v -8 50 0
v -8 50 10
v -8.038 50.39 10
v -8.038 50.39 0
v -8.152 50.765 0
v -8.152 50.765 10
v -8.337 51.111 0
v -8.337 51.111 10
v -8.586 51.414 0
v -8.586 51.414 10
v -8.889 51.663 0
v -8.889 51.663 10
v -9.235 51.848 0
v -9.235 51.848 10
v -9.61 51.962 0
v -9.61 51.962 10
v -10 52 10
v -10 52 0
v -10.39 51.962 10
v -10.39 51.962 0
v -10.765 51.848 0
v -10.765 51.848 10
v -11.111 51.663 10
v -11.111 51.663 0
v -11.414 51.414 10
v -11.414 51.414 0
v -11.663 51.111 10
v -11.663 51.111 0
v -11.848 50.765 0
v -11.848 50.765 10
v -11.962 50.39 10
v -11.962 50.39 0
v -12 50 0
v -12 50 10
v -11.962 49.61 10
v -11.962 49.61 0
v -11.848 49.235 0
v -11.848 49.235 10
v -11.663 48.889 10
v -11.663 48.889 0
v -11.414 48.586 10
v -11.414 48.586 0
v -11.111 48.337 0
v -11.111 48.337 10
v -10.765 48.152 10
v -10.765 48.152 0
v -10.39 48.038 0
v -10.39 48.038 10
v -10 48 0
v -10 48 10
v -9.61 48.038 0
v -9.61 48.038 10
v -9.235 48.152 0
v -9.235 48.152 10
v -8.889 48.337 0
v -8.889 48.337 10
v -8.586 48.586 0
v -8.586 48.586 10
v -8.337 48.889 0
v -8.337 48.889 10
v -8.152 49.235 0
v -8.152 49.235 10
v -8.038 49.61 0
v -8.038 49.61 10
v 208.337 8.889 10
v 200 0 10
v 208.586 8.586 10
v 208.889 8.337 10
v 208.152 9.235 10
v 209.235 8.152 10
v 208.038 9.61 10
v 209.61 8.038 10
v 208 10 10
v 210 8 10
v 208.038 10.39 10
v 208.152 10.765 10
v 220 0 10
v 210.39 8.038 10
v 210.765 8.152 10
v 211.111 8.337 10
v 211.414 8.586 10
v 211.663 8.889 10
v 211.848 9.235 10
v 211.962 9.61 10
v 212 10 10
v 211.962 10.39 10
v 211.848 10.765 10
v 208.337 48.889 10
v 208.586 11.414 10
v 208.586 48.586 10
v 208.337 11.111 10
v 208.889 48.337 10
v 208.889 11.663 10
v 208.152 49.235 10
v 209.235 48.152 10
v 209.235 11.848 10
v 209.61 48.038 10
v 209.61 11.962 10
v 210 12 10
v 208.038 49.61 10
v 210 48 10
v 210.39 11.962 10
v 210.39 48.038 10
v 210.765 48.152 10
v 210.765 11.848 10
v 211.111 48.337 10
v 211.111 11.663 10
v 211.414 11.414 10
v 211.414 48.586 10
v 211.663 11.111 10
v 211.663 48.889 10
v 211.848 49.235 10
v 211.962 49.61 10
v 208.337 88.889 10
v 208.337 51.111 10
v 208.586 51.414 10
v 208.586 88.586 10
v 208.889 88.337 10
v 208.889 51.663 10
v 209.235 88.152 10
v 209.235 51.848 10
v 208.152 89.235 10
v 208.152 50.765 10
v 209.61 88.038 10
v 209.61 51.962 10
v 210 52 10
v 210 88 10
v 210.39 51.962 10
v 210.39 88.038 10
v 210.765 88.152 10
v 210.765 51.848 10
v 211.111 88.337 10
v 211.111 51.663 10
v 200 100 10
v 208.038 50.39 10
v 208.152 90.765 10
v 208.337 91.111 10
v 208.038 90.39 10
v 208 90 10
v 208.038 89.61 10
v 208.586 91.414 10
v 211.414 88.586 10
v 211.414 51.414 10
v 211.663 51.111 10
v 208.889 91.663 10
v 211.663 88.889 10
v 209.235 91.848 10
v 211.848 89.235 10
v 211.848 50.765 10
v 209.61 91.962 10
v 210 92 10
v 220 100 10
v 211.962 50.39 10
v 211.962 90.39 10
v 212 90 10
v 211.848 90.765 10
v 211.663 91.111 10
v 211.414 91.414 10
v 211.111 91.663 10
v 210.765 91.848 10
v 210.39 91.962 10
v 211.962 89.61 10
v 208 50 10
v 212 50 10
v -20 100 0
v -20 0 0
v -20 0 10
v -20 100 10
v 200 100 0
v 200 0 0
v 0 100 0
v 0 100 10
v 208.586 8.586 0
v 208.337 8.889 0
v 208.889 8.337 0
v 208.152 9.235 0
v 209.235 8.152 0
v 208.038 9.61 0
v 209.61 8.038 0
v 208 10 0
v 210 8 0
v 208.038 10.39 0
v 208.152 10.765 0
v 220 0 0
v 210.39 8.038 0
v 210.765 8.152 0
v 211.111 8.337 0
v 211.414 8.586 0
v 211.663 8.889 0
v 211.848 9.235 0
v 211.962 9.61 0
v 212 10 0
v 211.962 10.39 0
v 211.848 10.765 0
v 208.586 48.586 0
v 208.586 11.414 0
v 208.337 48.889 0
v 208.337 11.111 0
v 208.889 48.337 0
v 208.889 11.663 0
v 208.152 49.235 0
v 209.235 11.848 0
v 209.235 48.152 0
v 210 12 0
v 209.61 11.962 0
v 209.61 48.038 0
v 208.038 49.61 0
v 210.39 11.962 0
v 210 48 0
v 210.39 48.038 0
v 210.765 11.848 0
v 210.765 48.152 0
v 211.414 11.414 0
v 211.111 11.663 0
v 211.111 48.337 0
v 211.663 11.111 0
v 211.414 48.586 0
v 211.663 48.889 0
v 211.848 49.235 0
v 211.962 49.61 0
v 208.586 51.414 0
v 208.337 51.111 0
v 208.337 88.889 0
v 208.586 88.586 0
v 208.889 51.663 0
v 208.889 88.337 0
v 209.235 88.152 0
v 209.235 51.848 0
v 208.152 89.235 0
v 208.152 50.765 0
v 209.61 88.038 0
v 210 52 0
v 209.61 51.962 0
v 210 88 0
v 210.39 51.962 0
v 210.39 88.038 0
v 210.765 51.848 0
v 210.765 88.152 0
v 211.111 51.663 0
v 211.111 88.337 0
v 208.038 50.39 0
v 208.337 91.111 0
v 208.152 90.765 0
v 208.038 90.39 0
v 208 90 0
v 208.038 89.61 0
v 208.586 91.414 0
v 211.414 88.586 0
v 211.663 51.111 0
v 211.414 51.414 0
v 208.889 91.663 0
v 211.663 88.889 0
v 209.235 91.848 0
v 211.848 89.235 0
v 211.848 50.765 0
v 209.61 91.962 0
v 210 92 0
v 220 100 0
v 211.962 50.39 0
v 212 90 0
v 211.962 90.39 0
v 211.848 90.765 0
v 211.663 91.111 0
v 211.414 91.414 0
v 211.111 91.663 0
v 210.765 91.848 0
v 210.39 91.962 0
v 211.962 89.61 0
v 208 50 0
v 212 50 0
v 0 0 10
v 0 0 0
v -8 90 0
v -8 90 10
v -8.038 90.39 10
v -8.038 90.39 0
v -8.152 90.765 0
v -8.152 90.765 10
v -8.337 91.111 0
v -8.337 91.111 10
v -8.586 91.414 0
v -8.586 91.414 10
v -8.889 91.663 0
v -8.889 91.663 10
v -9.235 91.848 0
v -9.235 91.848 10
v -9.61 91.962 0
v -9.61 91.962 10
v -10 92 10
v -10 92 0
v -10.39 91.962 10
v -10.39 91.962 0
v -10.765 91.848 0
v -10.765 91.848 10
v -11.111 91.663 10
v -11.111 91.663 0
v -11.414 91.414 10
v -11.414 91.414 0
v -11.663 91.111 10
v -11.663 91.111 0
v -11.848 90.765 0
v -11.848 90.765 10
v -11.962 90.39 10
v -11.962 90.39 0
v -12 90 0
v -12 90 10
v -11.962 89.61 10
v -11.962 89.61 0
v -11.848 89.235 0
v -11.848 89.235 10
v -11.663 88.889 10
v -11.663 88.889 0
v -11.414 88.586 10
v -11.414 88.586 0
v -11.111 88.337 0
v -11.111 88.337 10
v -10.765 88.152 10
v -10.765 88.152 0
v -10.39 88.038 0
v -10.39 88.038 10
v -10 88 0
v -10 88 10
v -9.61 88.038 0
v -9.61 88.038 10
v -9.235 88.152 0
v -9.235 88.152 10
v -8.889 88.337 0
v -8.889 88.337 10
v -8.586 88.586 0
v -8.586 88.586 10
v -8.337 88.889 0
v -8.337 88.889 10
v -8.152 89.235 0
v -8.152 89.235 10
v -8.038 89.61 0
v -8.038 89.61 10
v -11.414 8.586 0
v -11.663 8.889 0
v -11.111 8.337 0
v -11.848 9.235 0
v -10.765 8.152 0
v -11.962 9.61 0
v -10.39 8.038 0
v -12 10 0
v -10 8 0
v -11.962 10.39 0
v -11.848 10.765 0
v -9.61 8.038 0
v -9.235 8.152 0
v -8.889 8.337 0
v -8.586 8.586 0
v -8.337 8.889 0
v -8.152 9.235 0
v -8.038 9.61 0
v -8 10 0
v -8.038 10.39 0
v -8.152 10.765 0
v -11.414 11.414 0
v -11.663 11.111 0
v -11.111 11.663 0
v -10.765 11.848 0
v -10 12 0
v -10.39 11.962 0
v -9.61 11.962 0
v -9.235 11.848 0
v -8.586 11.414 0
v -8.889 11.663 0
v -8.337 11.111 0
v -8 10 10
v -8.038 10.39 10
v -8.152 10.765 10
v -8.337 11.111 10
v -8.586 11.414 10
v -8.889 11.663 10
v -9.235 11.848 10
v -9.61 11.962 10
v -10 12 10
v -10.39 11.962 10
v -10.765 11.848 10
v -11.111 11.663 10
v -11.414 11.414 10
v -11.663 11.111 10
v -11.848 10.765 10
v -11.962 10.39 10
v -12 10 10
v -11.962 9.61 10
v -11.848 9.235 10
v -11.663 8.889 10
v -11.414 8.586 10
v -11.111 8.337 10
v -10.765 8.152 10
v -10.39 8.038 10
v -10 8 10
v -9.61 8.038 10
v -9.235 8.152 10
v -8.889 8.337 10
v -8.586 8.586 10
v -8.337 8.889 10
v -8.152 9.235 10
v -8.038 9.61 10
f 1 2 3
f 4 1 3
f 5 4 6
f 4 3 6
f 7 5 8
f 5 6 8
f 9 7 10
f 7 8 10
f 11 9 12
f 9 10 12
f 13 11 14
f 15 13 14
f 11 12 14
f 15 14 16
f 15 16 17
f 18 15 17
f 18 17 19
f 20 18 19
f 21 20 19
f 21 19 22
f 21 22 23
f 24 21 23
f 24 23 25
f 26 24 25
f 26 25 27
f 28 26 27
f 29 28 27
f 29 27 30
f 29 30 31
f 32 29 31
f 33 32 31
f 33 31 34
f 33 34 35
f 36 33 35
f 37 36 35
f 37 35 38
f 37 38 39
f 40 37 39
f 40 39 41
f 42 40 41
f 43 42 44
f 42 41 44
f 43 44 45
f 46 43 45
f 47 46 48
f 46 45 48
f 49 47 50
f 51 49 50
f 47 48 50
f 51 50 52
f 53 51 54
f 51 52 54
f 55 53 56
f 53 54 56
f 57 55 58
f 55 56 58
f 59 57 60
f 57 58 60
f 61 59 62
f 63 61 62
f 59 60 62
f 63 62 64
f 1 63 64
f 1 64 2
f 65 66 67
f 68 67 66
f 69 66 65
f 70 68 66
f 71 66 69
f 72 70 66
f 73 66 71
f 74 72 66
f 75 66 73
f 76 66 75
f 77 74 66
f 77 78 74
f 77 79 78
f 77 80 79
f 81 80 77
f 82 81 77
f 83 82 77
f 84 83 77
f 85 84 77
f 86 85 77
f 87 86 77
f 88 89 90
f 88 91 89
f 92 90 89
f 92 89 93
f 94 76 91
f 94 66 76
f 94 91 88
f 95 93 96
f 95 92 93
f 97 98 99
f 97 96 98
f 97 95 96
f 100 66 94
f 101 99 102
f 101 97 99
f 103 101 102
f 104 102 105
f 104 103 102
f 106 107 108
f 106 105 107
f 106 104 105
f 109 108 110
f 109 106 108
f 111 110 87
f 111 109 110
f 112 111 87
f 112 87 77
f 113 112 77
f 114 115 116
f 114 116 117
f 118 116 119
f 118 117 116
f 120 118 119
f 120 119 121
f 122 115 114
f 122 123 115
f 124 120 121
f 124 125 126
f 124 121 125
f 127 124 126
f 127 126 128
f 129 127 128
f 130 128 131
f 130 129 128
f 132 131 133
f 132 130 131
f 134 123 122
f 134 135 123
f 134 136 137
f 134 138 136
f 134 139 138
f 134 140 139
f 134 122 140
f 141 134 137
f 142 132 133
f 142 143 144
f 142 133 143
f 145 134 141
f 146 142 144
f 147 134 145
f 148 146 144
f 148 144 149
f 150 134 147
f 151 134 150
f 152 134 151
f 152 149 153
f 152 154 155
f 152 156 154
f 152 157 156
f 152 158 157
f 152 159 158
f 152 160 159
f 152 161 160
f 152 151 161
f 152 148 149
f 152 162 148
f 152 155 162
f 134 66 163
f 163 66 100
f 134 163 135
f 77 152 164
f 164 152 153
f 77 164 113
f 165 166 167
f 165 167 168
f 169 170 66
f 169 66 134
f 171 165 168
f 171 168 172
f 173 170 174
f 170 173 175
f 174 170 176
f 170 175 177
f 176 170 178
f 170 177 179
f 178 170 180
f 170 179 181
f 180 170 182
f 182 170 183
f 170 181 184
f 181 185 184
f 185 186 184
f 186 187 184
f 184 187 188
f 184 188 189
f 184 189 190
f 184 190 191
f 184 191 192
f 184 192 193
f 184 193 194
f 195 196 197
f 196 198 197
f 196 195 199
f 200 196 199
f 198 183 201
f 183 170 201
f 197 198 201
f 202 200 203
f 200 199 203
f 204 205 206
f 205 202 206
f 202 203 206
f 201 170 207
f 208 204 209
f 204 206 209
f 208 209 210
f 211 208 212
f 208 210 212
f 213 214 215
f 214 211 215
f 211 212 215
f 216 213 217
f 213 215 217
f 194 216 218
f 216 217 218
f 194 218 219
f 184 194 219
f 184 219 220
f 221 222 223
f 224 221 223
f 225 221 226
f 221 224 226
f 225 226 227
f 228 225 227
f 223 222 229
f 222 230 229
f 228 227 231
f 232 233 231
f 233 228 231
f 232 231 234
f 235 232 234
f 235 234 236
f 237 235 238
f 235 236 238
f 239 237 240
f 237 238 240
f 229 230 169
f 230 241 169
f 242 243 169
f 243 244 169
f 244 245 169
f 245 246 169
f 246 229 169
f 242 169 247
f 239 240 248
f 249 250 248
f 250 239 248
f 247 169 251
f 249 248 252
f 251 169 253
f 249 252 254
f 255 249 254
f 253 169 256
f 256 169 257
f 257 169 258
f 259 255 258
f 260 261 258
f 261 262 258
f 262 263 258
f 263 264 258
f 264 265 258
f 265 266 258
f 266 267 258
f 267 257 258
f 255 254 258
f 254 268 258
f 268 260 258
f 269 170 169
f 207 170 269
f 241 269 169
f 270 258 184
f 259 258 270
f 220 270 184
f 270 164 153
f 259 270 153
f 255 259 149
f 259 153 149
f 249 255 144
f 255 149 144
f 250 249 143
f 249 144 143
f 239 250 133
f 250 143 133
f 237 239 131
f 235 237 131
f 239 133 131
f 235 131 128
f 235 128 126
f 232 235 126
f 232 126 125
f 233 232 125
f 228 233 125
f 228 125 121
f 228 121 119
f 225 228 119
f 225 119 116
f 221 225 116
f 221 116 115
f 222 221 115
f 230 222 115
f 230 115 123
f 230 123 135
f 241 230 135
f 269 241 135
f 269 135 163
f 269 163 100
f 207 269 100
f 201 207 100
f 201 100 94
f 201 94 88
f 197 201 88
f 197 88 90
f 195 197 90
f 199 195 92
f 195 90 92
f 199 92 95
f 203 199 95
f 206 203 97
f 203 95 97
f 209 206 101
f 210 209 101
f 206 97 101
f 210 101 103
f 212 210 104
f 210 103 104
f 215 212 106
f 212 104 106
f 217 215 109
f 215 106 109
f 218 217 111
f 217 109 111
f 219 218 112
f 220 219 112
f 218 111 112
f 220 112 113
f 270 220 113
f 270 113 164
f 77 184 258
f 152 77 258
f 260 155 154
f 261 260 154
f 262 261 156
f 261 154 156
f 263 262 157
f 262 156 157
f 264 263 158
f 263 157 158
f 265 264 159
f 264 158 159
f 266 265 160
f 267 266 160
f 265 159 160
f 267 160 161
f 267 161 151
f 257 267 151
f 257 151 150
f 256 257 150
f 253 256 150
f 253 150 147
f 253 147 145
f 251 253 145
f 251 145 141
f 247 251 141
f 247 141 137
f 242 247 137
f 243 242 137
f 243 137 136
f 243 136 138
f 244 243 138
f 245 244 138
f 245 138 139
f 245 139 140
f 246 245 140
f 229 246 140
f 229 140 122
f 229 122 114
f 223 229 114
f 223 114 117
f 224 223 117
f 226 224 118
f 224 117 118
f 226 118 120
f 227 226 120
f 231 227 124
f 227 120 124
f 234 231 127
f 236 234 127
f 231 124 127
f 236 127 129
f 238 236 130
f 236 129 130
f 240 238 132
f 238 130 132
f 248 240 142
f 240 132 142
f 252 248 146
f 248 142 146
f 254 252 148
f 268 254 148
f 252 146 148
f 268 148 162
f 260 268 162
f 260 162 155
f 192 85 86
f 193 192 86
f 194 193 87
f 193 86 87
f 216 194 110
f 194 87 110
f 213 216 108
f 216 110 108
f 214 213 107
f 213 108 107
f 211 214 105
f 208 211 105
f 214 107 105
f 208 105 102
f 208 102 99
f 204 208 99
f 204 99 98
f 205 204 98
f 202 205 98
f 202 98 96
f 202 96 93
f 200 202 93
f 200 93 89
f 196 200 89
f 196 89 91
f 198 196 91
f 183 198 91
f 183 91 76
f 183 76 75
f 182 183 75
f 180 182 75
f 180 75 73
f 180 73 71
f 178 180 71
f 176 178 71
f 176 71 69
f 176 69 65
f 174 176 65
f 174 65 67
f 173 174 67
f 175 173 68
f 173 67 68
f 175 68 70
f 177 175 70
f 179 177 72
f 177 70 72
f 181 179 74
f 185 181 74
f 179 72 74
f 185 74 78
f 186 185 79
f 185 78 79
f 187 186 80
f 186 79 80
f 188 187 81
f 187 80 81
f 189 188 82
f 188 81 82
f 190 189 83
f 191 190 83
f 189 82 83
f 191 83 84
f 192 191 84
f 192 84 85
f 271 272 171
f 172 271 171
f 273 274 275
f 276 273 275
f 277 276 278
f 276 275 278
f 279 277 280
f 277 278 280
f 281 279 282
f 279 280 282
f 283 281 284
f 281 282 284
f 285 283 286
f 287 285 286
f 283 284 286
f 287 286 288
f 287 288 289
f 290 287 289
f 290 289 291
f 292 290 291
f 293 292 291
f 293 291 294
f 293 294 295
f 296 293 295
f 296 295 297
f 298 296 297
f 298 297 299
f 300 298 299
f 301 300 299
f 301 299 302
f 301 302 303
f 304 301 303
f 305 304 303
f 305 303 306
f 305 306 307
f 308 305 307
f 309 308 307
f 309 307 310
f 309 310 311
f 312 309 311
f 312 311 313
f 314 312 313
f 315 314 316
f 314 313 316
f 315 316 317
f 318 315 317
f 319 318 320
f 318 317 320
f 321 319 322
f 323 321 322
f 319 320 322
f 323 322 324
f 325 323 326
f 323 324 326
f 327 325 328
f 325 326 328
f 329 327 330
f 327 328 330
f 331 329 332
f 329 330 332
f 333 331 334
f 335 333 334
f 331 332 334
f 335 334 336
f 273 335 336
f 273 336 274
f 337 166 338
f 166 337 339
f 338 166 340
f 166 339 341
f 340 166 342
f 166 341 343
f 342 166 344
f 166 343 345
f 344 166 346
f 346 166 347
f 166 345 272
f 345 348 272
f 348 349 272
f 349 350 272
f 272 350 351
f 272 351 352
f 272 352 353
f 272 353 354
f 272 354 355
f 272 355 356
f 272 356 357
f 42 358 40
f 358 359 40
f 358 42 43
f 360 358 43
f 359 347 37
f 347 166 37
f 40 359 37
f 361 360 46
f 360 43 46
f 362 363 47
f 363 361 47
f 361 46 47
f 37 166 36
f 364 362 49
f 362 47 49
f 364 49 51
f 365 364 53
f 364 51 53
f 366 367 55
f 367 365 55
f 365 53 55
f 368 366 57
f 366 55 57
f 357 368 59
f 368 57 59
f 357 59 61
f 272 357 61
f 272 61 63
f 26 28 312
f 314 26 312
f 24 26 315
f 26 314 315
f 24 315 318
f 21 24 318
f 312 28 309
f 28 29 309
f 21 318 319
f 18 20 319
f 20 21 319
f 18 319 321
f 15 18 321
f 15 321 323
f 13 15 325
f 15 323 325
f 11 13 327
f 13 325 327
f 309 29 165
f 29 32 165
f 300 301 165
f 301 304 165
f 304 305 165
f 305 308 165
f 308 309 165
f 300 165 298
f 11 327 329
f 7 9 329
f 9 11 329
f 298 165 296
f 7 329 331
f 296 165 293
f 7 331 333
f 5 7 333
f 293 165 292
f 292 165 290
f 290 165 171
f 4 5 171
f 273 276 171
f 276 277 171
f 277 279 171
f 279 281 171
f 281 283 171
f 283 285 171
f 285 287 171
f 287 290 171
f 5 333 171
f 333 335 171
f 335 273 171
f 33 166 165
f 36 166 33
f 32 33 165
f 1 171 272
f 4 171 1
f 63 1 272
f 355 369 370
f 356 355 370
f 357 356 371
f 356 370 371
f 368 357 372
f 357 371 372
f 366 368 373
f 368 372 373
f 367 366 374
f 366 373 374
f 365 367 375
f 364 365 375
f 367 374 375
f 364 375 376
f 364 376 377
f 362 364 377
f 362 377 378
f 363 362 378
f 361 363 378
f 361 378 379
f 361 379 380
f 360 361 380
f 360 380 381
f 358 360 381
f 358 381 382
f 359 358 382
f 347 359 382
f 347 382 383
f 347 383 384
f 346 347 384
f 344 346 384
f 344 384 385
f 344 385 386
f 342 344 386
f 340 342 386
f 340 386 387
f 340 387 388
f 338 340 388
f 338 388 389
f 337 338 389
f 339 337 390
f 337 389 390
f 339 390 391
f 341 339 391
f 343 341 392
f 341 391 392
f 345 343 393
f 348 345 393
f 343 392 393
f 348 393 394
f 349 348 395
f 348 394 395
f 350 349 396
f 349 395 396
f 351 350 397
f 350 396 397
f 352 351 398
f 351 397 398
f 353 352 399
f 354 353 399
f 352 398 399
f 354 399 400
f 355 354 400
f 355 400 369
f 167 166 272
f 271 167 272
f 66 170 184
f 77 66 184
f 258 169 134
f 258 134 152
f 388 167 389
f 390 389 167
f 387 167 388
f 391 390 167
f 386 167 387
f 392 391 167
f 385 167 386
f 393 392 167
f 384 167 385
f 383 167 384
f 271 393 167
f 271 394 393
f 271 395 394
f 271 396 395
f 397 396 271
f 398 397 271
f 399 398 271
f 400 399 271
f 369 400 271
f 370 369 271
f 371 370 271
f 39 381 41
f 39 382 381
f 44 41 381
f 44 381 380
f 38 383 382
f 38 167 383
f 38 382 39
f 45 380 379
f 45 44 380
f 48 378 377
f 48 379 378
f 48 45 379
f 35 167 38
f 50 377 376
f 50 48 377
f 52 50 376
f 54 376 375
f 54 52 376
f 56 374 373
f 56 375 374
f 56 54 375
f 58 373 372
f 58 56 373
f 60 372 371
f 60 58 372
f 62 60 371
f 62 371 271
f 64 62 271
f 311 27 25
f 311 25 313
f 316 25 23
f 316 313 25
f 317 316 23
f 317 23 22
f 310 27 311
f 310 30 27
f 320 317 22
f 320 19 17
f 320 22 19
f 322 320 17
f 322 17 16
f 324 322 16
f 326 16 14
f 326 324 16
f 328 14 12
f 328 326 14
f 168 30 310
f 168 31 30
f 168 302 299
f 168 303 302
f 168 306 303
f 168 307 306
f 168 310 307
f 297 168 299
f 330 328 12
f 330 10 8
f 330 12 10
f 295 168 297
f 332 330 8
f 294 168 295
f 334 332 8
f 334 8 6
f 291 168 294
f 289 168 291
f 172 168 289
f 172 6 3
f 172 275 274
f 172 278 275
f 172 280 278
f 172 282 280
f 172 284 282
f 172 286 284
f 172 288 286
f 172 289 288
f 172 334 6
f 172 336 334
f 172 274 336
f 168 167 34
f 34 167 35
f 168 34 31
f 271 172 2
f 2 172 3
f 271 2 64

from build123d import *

# Parameters (mm, degrees)
SKETCH1_W              = 20
SKETCH1_H              = 100
SUPPORTEXTRUDE_DEPTH   = 10
SUPPORTEXTRUDE_2_DEPTH = 10
SKETCH2_R              = 2
CUT_EXTRUDE1_DEPTH     = 11


with BuildPart() as part:
    # Sketch1 → SupportExtrude (new body)
    with BuildSketch(Plane.XY):
        with Locations((210, 50)):
            Rectangle(SKETCH1_W, SKETCH1_H)
    extrude(amount=SUPPORTEXTRUDE_DEPTH)


with BuildPart() as body_2:
    # Sketch1 → SupportExtrude 2 (new body)
    with BuildSketch(Plane.XY):
        with Locations((-10, 50)):
            Rectangle(SKETCH1_W, SKETCH1_H)
    extrude(amount=SUPPORTEXTRUDE_2_DEPTH)


with BuildPart() as cut_extrude1_tool:
    # Sketch2 → Cut-Extrude1 (new body, through all)
    with BuildSketch(Plane.XY.offset(10)):
        with Locations((-10, 10)):
            Circle(SKETCH2_R)
        with Locations((-10, 50)):
            Circle(SKETCH2_R)
        with Locations((-10, 90)):
            Circle(SKETCH2_R)
        with Locations((210, 10)):
            Circle(SKETCH2_R)
        with Locations((210, 50)):
            Circle(SKETCH2_R)
        with Locations((210, 90)):
            Circle(SKETCH2_R)
    extrude(amount=-CUT_EXTRUDE1_DEPTH)


with BuildPart() as part_1:
    add(part.part)

    # Cut-Extrude1: cut by cut_extrude1_tool
    add(cut_extrude1_tool.part, mode=Mode.SUBTRACT)


with BuildPart() as body_2_1:
    add(body_2.part)

    # Cut-Extrude1: cut by cut_extrude1_tool
    add(cut_extrude1_tool.part, mode=Mode.SUBTRACT)


solid = Compound([part_1.part, body_2_1.part])
